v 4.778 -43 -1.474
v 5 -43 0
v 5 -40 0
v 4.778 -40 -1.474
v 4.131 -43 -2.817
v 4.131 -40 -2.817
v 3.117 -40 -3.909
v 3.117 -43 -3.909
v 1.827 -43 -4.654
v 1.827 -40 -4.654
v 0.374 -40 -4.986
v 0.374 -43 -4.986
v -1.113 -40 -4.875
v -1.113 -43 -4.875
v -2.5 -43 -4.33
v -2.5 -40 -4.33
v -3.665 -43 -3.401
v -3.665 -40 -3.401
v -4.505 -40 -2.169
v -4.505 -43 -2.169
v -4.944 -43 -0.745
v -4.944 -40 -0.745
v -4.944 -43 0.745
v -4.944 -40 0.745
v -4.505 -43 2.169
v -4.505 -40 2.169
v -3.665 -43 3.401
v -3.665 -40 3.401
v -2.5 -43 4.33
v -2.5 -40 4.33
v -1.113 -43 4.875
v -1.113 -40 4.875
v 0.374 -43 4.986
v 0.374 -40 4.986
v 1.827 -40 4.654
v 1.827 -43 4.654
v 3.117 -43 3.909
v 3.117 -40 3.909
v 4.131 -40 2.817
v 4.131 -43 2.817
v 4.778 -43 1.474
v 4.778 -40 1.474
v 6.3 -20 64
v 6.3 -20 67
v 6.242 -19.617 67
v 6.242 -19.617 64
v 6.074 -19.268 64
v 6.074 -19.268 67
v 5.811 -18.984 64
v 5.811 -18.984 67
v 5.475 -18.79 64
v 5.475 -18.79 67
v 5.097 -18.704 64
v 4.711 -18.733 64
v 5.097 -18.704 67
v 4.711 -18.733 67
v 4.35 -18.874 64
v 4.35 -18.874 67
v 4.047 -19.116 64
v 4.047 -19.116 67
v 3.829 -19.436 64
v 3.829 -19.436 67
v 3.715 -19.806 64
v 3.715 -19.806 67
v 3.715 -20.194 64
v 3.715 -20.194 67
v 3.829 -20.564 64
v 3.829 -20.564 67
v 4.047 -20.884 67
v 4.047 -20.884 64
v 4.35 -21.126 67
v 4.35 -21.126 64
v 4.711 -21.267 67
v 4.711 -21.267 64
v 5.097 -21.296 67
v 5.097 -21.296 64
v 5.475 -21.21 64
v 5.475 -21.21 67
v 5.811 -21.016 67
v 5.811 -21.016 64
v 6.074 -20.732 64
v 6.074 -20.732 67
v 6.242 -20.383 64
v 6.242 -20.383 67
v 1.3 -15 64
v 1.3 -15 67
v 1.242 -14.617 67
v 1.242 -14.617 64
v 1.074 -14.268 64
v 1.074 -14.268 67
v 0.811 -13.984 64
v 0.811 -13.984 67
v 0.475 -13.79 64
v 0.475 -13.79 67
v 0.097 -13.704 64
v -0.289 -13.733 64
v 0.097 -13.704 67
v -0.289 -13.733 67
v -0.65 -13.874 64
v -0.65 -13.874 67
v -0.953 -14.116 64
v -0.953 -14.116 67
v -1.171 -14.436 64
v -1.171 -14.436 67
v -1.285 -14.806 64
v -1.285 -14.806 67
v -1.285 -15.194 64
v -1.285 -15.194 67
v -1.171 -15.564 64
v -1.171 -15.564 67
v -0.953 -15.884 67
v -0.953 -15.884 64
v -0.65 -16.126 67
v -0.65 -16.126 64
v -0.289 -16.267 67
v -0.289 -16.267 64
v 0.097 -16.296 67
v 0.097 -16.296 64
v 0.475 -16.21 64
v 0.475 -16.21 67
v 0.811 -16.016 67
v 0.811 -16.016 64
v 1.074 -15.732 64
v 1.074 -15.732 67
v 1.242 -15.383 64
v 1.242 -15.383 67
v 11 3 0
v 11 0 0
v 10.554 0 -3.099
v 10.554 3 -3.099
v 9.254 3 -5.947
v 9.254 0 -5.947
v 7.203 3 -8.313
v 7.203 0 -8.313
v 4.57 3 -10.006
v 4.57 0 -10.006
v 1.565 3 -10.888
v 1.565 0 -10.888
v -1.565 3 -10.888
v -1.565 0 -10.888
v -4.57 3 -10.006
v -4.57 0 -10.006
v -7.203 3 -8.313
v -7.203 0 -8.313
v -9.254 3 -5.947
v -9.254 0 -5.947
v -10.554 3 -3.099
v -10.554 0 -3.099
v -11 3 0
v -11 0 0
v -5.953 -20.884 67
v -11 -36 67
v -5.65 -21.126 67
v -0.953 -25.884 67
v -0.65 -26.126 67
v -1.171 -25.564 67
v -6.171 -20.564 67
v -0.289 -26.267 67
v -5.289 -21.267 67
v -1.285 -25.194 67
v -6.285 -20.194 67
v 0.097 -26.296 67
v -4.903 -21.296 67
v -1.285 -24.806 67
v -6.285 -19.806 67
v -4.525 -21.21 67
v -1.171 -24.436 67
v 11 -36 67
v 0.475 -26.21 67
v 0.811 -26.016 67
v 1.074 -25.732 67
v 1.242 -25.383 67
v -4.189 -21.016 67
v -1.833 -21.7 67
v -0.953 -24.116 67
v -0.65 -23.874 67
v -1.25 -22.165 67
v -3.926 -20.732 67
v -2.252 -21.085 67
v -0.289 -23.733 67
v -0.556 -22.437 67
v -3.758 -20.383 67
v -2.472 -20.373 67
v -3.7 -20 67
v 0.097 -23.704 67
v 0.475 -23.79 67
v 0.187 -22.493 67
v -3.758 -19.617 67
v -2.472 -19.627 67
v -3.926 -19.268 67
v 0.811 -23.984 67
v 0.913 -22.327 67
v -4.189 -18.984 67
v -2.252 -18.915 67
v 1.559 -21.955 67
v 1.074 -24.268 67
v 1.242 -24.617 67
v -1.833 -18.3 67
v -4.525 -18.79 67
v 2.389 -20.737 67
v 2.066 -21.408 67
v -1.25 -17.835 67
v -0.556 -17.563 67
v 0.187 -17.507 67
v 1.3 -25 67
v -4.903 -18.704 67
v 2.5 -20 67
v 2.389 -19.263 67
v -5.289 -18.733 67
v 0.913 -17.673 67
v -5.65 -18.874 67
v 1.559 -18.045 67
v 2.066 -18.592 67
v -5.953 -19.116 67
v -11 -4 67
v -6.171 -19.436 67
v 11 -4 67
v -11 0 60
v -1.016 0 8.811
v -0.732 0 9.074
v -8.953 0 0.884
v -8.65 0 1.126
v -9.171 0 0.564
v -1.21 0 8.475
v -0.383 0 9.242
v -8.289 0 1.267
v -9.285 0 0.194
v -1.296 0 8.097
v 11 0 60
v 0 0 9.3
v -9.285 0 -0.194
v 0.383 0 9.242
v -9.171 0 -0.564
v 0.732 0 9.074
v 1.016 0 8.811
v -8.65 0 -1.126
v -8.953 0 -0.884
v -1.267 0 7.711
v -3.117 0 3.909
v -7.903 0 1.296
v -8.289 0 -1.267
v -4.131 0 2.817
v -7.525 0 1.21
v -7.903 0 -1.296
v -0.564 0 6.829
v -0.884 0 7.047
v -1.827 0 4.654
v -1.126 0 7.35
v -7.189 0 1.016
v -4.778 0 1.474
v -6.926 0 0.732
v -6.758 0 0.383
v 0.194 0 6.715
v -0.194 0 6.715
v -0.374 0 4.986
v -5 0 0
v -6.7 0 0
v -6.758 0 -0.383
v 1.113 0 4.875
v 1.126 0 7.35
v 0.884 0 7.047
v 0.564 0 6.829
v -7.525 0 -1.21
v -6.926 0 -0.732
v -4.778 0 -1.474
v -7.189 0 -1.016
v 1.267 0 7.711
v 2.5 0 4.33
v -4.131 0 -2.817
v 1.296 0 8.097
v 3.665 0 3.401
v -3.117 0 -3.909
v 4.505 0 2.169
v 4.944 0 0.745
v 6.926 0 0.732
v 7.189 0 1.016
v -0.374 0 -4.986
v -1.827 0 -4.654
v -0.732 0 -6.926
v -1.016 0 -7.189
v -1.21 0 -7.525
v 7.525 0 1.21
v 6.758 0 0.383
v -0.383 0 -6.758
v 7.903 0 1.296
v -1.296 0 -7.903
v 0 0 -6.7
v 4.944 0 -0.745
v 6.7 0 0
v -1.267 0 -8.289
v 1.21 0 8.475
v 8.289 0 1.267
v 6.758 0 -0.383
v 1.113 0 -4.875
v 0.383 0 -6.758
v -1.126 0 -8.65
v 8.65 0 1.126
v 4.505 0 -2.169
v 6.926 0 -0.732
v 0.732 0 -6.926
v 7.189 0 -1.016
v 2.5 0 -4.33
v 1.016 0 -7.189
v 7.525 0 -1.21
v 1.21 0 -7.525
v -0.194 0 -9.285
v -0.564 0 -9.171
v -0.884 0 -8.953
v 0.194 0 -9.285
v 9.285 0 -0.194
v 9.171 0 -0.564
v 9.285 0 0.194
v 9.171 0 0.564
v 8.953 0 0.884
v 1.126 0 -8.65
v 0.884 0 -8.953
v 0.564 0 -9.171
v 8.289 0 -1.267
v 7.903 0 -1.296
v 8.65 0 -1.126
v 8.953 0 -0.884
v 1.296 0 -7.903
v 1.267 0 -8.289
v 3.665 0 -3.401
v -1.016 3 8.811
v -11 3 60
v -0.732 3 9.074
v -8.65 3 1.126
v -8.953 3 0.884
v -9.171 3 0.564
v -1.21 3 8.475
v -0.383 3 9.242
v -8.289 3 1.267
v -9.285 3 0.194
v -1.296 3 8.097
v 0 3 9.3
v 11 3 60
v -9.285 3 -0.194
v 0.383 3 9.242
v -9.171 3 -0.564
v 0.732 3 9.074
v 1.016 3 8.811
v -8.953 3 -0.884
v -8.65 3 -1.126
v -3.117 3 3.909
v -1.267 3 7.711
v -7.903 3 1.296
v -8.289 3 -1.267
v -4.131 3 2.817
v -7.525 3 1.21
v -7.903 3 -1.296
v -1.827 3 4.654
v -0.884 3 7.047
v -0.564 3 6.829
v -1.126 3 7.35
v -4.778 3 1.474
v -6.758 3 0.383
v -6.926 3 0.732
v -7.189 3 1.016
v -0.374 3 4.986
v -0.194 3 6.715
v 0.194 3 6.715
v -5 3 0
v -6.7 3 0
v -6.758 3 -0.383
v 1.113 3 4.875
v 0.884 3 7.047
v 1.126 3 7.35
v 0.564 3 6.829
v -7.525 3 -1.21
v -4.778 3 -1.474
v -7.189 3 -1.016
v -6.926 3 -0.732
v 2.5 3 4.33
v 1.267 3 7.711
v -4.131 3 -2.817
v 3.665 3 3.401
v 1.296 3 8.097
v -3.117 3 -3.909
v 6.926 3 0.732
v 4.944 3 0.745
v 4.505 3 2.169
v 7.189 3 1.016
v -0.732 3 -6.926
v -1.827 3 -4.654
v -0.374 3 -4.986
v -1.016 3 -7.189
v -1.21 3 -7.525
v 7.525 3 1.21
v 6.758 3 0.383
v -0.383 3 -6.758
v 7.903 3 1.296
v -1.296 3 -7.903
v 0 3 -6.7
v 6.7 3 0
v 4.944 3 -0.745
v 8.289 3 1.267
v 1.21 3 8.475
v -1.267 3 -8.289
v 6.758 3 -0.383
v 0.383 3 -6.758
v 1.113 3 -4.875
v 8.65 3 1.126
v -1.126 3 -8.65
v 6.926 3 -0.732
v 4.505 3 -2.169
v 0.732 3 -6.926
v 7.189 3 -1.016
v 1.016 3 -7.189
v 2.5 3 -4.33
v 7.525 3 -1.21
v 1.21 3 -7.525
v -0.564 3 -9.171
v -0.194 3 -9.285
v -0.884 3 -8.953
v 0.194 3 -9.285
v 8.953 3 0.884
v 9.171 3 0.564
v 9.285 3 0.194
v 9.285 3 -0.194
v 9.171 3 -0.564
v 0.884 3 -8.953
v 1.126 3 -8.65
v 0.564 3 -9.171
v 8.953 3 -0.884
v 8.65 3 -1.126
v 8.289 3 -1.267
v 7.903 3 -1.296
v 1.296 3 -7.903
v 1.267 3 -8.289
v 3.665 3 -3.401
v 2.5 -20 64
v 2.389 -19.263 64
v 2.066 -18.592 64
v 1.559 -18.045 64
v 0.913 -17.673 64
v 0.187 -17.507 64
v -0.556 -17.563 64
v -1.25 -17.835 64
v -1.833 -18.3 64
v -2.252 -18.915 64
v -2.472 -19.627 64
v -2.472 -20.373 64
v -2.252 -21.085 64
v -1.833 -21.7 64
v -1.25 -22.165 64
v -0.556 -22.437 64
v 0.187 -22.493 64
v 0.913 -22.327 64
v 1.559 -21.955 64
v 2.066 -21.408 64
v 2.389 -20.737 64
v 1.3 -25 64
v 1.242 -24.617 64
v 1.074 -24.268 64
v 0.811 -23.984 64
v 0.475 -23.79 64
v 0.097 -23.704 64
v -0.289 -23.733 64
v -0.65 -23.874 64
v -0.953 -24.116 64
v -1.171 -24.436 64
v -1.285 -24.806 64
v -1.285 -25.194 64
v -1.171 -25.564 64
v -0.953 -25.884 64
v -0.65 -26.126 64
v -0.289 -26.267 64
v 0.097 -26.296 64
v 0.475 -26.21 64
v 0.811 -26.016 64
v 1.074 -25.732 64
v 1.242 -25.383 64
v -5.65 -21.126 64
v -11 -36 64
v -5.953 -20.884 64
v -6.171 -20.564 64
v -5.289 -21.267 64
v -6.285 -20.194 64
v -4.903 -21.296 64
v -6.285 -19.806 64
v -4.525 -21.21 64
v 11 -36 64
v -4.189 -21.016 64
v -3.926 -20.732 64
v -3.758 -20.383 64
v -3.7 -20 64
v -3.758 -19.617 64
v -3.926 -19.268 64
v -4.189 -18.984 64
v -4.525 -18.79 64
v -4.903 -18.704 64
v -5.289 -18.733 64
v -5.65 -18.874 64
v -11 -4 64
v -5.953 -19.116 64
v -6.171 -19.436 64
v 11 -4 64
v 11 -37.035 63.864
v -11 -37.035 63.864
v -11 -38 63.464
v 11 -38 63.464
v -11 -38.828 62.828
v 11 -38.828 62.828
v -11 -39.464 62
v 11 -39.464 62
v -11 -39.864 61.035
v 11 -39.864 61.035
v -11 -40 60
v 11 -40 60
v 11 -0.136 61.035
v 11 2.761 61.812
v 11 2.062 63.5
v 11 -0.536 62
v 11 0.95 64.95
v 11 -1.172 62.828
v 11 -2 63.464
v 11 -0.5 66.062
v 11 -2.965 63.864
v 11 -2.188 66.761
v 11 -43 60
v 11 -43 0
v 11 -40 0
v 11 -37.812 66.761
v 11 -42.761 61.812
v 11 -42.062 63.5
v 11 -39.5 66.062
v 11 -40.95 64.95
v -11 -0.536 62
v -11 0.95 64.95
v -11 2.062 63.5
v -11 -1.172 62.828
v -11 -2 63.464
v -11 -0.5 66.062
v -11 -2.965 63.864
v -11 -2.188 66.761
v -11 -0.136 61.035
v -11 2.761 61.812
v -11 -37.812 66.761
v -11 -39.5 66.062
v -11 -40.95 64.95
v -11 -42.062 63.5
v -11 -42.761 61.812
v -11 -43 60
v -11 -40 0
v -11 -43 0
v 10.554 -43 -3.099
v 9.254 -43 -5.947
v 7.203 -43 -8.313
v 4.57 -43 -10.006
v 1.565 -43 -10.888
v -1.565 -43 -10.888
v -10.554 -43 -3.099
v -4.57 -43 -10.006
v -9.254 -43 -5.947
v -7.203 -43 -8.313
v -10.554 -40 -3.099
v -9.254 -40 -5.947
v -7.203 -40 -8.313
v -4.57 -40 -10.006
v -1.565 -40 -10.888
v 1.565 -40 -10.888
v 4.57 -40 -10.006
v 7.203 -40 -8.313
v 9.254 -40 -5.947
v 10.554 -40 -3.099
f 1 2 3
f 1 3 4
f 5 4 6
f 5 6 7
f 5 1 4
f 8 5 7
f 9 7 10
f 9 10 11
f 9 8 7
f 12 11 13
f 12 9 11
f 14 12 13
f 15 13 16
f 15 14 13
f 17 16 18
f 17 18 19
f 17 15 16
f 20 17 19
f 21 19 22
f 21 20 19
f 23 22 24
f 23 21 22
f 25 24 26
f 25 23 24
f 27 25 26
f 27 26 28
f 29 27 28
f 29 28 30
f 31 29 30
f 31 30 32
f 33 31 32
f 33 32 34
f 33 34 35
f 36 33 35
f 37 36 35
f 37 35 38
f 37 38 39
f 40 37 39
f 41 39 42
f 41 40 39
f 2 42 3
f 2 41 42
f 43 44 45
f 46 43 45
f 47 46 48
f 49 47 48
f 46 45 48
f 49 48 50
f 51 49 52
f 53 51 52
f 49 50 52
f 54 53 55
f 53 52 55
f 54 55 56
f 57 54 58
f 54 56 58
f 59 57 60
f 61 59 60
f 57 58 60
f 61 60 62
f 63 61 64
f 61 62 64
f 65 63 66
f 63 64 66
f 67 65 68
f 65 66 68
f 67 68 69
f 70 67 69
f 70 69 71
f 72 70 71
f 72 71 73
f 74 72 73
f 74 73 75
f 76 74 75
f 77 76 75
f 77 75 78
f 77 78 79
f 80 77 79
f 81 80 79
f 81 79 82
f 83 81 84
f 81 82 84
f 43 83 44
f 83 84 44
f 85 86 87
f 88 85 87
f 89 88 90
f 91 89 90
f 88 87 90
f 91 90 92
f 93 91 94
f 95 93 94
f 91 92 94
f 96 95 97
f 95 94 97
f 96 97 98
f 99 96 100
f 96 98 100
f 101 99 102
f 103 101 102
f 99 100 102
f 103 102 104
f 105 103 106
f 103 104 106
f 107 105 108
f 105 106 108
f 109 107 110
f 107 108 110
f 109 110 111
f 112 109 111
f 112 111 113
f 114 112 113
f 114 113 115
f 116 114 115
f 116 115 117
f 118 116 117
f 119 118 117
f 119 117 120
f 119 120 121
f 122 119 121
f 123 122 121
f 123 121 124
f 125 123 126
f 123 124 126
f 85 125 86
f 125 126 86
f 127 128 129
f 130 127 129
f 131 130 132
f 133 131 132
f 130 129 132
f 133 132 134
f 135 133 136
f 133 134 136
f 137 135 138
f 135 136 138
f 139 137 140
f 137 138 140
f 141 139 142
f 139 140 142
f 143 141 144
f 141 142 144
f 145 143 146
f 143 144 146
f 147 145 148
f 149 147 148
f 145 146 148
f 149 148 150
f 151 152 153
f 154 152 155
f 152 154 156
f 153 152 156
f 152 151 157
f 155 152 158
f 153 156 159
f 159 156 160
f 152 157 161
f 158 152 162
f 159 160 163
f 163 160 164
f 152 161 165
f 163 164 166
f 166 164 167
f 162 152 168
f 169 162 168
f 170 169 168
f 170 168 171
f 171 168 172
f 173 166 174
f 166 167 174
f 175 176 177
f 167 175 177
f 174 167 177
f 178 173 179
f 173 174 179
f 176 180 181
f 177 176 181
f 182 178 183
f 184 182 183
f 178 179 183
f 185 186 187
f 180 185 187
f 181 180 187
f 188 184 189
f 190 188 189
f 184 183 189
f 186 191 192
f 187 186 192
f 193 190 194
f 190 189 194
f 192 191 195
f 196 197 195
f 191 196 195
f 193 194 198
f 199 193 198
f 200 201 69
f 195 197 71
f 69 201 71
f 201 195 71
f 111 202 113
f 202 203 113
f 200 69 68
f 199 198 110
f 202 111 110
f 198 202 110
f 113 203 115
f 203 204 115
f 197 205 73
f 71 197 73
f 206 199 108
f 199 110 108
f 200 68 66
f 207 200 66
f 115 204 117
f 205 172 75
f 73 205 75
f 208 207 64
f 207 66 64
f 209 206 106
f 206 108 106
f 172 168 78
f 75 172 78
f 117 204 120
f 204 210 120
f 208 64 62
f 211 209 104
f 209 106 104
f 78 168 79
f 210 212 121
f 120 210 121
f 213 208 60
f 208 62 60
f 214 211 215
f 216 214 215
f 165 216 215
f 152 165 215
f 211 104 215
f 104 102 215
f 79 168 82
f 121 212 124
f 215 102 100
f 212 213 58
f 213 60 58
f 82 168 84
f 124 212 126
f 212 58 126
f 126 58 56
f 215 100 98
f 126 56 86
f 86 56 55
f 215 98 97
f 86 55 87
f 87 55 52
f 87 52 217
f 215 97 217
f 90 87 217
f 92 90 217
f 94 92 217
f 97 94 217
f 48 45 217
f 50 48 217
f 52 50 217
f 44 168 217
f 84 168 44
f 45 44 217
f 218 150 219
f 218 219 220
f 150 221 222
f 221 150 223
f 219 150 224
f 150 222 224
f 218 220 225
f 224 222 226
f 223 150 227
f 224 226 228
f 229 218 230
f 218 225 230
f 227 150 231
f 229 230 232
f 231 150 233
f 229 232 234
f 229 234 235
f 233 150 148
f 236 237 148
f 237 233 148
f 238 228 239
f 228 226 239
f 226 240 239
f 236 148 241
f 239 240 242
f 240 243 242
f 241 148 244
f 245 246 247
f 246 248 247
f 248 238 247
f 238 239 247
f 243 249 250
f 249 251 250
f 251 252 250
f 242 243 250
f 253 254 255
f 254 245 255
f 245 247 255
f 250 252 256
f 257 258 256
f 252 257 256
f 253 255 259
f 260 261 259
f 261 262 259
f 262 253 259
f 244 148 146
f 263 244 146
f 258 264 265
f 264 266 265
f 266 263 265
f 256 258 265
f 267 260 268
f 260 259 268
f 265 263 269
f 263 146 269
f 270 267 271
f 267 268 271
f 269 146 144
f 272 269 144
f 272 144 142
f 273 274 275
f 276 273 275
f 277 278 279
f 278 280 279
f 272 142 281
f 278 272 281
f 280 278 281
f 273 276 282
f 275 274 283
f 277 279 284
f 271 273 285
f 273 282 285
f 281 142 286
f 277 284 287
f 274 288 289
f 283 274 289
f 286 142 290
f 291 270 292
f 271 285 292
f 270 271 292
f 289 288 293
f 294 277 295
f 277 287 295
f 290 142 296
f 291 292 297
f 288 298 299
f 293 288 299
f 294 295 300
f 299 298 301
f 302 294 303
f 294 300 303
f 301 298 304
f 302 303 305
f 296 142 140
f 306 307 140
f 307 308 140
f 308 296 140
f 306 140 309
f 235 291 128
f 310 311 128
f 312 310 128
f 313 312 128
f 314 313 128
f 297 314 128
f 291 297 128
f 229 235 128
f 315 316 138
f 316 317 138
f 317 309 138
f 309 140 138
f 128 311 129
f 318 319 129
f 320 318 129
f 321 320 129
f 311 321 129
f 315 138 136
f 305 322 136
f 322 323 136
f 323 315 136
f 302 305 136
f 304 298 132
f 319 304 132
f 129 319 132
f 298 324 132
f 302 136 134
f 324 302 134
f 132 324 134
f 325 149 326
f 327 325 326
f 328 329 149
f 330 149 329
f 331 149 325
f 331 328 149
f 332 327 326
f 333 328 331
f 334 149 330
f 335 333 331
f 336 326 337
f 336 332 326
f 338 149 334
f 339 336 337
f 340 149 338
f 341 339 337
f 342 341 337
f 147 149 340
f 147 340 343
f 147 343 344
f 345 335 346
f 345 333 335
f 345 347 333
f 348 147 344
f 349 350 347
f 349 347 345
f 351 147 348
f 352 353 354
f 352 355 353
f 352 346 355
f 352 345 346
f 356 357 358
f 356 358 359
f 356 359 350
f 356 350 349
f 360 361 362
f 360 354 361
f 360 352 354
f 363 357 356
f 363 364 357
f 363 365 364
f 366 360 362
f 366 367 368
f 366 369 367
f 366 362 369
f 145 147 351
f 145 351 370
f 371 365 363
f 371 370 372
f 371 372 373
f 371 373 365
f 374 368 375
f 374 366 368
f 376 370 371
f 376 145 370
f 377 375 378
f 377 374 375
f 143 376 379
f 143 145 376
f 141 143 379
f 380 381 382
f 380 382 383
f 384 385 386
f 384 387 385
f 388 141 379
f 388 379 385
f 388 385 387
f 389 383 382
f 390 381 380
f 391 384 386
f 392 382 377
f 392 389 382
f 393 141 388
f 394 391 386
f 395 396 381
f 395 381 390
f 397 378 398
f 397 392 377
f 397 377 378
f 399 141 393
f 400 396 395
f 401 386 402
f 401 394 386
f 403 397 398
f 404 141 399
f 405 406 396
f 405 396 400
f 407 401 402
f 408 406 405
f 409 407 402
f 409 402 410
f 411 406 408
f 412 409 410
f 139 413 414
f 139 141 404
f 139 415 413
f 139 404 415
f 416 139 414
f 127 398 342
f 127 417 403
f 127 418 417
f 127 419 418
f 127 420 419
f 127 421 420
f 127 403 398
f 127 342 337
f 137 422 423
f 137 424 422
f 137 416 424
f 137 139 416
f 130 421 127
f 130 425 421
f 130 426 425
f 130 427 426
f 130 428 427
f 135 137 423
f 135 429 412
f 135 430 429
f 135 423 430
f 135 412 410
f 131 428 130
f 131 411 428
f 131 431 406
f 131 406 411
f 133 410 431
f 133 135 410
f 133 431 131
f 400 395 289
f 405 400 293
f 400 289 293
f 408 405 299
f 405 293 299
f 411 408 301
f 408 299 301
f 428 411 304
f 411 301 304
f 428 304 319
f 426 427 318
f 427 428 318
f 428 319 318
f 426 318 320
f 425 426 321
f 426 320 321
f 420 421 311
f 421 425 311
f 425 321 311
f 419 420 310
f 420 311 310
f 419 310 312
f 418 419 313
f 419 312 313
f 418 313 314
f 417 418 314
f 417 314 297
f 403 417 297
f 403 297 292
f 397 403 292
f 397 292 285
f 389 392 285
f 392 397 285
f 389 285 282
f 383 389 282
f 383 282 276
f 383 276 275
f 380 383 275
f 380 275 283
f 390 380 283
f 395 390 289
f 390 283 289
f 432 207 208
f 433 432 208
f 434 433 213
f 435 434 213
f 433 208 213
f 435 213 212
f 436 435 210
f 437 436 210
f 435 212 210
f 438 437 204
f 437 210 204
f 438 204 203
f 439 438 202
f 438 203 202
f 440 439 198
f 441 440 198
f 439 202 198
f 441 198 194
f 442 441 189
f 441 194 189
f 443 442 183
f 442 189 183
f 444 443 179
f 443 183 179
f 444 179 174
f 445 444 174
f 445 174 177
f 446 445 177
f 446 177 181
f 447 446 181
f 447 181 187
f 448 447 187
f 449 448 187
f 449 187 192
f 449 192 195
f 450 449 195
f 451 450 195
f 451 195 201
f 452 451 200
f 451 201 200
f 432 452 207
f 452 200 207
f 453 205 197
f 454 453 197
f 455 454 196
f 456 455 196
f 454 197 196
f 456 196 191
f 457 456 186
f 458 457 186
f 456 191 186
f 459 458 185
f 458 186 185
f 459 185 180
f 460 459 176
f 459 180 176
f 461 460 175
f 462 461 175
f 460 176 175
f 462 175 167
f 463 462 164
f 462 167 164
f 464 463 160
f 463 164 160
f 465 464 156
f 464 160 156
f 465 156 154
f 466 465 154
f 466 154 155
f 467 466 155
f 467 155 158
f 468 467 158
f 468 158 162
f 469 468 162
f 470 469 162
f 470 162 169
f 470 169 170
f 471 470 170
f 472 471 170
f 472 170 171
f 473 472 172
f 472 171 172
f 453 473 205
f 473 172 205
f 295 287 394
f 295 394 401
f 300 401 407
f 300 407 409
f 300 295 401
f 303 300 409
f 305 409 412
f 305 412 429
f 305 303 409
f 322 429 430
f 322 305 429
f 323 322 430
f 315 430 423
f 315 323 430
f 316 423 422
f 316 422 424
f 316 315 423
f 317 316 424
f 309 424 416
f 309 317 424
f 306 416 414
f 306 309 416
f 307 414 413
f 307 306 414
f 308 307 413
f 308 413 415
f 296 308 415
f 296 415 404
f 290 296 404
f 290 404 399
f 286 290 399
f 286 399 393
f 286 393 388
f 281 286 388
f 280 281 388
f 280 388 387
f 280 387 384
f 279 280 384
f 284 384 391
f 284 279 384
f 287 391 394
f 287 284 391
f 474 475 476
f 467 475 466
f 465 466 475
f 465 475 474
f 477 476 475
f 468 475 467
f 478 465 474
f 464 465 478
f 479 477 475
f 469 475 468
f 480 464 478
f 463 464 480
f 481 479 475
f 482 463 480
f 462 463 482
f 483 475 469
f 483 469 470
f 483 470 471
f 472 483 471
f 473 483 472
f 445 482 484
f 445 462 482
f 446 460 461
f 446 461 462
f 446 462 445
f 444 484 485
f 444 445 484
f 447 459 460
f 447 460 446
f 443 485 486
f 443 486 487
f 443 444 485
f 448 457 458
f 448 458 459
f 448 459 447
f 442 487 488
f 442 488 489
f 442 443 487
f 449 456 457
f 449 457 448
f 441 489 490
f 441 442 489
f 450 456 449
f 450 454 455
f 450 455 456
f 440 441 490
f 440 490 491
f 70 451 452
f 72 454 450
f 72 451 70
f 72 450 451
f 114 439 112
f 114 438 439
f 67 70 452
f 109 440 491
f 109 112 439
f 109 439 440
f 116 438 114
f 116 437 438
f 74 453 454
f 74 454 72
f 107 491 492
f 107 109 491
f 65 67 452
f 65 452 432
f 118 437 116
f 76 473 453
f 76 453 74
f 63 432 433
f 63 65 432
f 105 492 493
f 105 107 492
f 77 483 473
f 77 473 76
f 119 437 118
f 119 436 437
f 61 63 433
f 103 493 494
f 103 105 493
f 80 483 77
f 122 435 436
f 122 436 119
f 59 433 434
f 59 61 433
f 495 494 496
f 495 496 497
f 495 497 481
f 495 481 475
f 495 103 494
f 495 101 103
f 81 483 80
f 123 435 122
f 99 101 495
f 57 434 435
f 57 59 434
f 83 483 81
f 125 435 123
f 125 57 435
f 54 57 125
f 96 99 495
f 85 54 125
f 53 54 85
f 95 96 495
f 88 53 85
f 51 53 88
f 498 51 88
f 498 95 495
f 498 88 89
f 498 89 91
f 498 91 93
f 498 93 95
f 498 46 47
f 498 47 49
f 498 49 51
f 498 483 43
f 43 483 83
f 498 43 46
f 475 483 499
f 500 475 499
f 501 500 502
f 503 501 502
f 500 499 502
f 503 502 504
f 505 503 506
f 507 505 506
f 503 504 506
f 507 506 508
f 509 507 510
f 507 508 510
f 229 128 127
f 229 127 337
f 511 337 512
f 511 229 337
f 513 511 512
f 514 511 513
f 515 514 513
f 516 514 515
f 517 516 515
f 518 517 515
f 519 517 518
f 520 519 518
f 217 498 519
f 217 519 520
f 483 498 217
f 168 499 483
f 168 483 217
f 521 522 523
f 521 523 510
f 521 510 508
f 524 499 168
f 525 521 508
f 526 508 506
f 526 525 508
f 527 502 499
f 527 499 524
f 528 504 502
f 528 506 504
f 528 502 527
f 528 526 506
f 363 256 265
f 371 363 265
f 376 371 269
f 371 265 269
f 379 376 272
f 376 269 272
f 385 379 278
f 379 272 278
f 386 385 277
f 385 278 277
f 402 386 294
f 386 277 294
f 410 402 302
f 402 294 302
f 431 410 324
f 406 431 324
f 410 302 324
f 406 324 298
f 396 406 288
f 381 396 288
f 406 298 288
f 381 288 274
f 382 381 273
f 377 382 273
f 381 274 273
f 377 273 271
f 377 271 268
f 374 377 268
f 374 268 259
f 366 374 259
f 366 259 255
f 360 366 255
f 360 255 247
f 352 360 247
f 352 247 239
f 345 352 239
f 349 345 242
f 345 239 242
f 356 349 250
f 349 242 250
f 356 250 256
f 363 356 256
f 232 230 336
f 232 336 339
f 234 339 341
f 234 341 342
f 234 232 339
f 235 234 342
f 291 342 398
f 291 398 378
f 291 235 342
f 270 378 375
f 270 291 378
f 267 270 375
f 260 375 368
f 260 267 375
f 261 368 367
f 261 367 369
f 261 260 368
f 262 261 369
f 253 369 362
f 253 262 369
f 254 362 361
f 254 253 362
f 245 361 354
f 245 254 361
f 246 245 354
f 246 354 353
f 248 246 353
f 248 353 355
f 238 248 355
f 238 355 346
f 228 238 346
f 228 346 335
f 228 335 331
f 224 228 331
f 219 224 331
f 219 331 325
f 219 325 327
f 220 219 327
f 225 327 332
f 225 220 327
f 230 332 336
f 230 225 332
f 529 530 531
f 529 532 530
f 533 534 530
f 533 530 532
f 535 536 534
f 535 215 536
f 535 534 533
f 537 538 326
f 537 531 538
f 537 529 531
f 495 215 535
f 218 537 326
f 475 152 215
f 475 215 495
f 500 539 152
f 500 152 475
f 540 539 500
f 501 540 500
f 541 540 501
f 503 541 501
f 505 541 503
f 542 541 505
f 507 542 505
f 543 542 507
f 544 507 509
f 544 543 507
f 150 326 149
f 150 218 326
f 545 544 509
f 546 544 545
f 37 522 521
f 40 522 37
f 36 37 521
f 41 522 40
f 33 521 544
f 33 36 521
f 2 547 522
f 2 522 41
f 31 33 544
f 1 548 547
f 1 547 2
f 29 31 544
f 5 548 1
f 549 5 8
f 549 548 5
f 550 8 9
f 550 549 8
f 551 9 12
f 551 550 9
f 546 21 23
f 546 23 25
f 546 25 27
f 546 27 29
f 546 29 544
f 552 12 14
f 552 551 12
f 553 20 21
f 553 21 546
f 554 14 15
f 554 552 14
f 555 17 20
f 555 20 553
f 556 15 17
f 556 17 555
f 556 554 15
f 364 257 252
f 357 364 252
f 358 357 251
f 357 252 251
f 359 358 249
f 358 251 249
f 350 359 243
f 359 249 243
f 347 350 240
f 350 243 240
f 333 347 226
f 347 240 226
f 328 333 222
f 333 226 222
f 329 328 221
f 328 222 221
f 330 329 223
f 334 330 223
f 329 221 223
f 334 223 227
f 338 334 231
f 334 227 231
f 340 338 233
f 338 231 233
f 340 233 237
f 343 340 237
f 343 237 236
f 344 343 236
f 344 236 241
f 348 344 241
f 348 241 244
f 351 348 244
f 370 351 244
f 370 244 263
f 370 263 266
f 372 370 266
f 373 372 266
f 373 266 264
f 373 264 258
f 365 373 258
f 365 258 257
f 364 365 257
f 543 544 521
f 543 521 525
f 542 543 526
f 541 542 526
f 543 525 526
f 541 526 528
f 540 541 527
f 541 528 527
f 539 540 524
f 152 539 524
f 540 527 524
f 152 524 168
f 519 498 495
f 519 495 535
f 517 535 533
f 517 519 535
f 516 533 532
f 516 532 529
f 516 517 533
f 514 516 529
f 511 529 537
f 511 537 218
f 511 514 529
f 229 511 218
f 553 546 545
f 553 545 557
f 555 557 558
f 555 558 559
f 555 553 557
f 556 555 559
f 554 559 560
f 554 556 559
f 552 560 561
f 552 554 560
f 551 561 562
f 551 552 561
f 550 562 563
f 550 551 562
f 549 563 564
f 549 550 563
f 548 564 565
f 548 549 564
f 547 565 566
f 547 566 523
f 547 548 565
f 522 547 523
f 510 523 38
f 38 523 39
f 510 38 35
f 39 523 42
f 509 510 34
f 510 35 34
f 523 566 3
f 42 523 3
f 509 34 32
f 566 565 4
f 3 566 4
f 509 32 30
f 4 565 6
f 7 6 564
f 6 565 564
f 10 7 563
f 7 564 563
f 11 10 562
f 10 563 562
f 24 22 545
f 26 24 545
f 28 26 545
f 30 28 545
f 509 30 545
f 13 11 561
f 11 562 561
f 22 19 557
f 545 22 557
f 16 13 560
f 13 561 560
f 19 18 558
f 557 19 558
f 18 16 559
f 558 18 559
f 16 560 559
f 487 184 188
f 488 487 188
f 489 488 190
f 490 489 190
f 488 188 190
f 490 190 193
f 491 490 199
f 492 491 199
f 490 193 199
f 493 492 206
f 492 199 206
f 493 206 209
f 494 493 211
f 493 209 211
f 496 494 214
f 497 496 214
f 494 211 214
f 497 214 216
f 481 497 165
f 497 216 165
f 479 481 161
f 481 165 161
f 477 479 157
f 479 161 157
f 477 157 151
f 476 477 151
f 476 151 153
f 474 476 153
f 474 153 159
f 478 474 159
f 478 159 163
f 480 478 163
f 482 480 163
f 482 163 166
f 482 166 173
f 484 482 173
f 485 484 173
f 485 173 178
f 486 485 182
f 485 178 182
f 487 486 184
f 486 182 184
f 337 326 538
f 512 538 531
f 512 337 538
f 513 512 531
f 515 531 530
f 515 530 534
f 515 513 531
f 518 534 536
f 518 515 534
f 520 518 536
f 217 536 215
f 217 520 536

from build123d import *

# Parameters (mm, degrees)
SKETCH1_R           = 1.3
BOSS_EXTRUDE1_DEPTH = 3
SKETCH2_W           = 3
SKETCH2_H           = 32
BOSS_EXTRUDE2_DEPTH = 22
BOSS_EXTRUDE3_START = 3
BOSS_EXTRUDE3_DEPTH = 3
SKETCH7_R           = 2.5
SKETCH7_R_2         = 1.3
CUT_EXTRUDE1_DEPTH  = 3


with BuildPart() as part:
    # Sketch1 → Boss-Extrude1 (new body)
    # profile 1 of 3: a face of its own
    with BuildSketch(Plane(origin=(0, 0, 0), x_dir=(1, 0, 0), z_dir=(0, 1, 0))):
        with BuildLine():
            Line((11, -60), (11, 0))
            ThreePointArc((11, 0), (0, -11), (-11, 0))
            Line((-11, 0), (-11, -60))
            Line((-11, -60), (11, -60))
        make_face()
    # profile 2 of 3: a face of its own
    with BuildSketch(Plane(origin=(0, 0, 0), x_dir=(1, 0, 0), z_dir=(0, 1, 0))):
        with BuildLine():
            Line((11, 0), (9.3, 0))
            ThreePointArc((9.3, 0), (8, -1.3), (6.7, 0))
            Line((6.7, 0), (5, 0))
            ThreePointArc((5, 0), (0, -5), (-5, 0))
            Line((-5, 0), (-6.7, 0))
            ThreePointArc((-6.7, 0), (-8, -1.3), (-9.3, 0))
            Line((-9.3, 0), (-11, 0))
            ThreePointArc((-11, 0), (0, -11), (11, 0))
        make_face()
        with Locations(Location((0, -8, 0), (0, 0, 270))):
            Circle(SKETCH1_R, mode=Mode.SUBTRACT)
    # profile 3 of 3: a face of its own
    with BuildSketch(Plane(origin=(0, 0, 0), x_dir=(1, 0, 0), z_dir=(0, 1, 0))):
        with BuildLine():
            ThreePointArc((6.7, 0), (8, 1.3), (9.3, 0))
            Line((9.3, 0), (11, 0))
            ThreePointArc((11, 0), (0, 11), (-11, 0))
            Line((-11, 0), (-9.3, 0))
            ThreePointArc((-9.3, 0), (-8, 1.3), (-6.7, 0))
            Line((-6.7, 0), (-5, 0))
            ThreePointArc((-5, 0), (0, 5), (5, 0))
            Line((5, 0), (6.7, 0))
        make_face()
        with Locations(Location((0, 8, 0), (0, 0, 270))):
            Circle(SKETCH1_R, mode=Mode.SUBTRACT)
    extrude(amount=BOSS_EXTRUDE1_DEPTH)

    # Sketch2 → Boss-Extrude2 (add)
    with BuildSketch(Plane(origin=(11, 0, 0), x_dir=(0, 0, -1), z_dir=(1, 0, 0))):
        with Locations((-65.5, -20)):
            Rectangle(SKETCH2_W, SKETCH2_H)
        with BuildLine():
            ThreePointArc((-60, 3), (-64.949747468, 0.949747468), (-67, -4))
            Line((-67, -4), (-64, -4))
            ThreePointArc((-64, -4), (-62.828427125, -1.171572875), (-60, 0))
            Line((-60, 0), (-60, 3))
        make_face()
        with BuildLine():
            ThreePointArc((-64, -36), (-62.828427125, -38.828427125), (-60, -40))
            Line((-60, -40), (-60, -43))
            ThreePointArc((-60, -43), (-64.949747468, -40.949747468), (-67, -36))
            Line((-67, -36), (-64, -36))
        make_face()
    extrude(amount=-BOSS_EXTRUDE2_DEPTH)

    # Sketch6 → Boss-Extrude3 (add)
    with BuildSketch(Plane(origin=(0, -40, 0), x_dir=(-1, 0, 0), z_dir=(0, -1, 0)).offset(BOSS_EXTRUDE3_START)):
        with BuildLine():
            Line((11, -60), (11, 0))
            ThreePointArc((11, 0), (0, -11), (-11, 0))
            Line((-11, 0), (-11, -60))
            Line((-11, -60), (11, -60))
        make_face()
        with BuildLine():
            ThreePointArc((-5, 0), (0, 5), (5, 0))
            Line((5, 0), (11, 0))
            ThreePointArc((11, 0), (0, 11), (-11, 0))
            Line((-11, 0), (-5, 0))
        make_face()
        with BuildLine():
            Line((11, 0), (5, 0))
            ThreePointArc((5, 0), (0, -5), (-5, 0))
            Line((-5, 0), (-11, 0))
            ThreePointArc((-11, 0), (0, -11), (11, 0))
        make_face()
    extrude(amount=-BOSS_EXTRUDE3_DEPTH)

    # Sketch7 → Cut-Extrude1 (cut)
    with BuildSketch(Plane.XY.offset(67)):
        with Locations((0, -20)):
            Circle(SKETCH7_R)
        with Locations((5, -20)):
            Circle(SKETCH7_R_2)
        with Locations((-5, -20)):
            Circle(SKETCH7_R_2)
        with Locations((0, -25)):
            Circle(SKETCH7_R_2)
        with Locations((0, -15)):
            Circle(SKETCH7_R_2)
    extrude(amount=-CUT_EXTRUDE1_DEPTH, mode=Mode.SUBTRACT)


solid = part.part
